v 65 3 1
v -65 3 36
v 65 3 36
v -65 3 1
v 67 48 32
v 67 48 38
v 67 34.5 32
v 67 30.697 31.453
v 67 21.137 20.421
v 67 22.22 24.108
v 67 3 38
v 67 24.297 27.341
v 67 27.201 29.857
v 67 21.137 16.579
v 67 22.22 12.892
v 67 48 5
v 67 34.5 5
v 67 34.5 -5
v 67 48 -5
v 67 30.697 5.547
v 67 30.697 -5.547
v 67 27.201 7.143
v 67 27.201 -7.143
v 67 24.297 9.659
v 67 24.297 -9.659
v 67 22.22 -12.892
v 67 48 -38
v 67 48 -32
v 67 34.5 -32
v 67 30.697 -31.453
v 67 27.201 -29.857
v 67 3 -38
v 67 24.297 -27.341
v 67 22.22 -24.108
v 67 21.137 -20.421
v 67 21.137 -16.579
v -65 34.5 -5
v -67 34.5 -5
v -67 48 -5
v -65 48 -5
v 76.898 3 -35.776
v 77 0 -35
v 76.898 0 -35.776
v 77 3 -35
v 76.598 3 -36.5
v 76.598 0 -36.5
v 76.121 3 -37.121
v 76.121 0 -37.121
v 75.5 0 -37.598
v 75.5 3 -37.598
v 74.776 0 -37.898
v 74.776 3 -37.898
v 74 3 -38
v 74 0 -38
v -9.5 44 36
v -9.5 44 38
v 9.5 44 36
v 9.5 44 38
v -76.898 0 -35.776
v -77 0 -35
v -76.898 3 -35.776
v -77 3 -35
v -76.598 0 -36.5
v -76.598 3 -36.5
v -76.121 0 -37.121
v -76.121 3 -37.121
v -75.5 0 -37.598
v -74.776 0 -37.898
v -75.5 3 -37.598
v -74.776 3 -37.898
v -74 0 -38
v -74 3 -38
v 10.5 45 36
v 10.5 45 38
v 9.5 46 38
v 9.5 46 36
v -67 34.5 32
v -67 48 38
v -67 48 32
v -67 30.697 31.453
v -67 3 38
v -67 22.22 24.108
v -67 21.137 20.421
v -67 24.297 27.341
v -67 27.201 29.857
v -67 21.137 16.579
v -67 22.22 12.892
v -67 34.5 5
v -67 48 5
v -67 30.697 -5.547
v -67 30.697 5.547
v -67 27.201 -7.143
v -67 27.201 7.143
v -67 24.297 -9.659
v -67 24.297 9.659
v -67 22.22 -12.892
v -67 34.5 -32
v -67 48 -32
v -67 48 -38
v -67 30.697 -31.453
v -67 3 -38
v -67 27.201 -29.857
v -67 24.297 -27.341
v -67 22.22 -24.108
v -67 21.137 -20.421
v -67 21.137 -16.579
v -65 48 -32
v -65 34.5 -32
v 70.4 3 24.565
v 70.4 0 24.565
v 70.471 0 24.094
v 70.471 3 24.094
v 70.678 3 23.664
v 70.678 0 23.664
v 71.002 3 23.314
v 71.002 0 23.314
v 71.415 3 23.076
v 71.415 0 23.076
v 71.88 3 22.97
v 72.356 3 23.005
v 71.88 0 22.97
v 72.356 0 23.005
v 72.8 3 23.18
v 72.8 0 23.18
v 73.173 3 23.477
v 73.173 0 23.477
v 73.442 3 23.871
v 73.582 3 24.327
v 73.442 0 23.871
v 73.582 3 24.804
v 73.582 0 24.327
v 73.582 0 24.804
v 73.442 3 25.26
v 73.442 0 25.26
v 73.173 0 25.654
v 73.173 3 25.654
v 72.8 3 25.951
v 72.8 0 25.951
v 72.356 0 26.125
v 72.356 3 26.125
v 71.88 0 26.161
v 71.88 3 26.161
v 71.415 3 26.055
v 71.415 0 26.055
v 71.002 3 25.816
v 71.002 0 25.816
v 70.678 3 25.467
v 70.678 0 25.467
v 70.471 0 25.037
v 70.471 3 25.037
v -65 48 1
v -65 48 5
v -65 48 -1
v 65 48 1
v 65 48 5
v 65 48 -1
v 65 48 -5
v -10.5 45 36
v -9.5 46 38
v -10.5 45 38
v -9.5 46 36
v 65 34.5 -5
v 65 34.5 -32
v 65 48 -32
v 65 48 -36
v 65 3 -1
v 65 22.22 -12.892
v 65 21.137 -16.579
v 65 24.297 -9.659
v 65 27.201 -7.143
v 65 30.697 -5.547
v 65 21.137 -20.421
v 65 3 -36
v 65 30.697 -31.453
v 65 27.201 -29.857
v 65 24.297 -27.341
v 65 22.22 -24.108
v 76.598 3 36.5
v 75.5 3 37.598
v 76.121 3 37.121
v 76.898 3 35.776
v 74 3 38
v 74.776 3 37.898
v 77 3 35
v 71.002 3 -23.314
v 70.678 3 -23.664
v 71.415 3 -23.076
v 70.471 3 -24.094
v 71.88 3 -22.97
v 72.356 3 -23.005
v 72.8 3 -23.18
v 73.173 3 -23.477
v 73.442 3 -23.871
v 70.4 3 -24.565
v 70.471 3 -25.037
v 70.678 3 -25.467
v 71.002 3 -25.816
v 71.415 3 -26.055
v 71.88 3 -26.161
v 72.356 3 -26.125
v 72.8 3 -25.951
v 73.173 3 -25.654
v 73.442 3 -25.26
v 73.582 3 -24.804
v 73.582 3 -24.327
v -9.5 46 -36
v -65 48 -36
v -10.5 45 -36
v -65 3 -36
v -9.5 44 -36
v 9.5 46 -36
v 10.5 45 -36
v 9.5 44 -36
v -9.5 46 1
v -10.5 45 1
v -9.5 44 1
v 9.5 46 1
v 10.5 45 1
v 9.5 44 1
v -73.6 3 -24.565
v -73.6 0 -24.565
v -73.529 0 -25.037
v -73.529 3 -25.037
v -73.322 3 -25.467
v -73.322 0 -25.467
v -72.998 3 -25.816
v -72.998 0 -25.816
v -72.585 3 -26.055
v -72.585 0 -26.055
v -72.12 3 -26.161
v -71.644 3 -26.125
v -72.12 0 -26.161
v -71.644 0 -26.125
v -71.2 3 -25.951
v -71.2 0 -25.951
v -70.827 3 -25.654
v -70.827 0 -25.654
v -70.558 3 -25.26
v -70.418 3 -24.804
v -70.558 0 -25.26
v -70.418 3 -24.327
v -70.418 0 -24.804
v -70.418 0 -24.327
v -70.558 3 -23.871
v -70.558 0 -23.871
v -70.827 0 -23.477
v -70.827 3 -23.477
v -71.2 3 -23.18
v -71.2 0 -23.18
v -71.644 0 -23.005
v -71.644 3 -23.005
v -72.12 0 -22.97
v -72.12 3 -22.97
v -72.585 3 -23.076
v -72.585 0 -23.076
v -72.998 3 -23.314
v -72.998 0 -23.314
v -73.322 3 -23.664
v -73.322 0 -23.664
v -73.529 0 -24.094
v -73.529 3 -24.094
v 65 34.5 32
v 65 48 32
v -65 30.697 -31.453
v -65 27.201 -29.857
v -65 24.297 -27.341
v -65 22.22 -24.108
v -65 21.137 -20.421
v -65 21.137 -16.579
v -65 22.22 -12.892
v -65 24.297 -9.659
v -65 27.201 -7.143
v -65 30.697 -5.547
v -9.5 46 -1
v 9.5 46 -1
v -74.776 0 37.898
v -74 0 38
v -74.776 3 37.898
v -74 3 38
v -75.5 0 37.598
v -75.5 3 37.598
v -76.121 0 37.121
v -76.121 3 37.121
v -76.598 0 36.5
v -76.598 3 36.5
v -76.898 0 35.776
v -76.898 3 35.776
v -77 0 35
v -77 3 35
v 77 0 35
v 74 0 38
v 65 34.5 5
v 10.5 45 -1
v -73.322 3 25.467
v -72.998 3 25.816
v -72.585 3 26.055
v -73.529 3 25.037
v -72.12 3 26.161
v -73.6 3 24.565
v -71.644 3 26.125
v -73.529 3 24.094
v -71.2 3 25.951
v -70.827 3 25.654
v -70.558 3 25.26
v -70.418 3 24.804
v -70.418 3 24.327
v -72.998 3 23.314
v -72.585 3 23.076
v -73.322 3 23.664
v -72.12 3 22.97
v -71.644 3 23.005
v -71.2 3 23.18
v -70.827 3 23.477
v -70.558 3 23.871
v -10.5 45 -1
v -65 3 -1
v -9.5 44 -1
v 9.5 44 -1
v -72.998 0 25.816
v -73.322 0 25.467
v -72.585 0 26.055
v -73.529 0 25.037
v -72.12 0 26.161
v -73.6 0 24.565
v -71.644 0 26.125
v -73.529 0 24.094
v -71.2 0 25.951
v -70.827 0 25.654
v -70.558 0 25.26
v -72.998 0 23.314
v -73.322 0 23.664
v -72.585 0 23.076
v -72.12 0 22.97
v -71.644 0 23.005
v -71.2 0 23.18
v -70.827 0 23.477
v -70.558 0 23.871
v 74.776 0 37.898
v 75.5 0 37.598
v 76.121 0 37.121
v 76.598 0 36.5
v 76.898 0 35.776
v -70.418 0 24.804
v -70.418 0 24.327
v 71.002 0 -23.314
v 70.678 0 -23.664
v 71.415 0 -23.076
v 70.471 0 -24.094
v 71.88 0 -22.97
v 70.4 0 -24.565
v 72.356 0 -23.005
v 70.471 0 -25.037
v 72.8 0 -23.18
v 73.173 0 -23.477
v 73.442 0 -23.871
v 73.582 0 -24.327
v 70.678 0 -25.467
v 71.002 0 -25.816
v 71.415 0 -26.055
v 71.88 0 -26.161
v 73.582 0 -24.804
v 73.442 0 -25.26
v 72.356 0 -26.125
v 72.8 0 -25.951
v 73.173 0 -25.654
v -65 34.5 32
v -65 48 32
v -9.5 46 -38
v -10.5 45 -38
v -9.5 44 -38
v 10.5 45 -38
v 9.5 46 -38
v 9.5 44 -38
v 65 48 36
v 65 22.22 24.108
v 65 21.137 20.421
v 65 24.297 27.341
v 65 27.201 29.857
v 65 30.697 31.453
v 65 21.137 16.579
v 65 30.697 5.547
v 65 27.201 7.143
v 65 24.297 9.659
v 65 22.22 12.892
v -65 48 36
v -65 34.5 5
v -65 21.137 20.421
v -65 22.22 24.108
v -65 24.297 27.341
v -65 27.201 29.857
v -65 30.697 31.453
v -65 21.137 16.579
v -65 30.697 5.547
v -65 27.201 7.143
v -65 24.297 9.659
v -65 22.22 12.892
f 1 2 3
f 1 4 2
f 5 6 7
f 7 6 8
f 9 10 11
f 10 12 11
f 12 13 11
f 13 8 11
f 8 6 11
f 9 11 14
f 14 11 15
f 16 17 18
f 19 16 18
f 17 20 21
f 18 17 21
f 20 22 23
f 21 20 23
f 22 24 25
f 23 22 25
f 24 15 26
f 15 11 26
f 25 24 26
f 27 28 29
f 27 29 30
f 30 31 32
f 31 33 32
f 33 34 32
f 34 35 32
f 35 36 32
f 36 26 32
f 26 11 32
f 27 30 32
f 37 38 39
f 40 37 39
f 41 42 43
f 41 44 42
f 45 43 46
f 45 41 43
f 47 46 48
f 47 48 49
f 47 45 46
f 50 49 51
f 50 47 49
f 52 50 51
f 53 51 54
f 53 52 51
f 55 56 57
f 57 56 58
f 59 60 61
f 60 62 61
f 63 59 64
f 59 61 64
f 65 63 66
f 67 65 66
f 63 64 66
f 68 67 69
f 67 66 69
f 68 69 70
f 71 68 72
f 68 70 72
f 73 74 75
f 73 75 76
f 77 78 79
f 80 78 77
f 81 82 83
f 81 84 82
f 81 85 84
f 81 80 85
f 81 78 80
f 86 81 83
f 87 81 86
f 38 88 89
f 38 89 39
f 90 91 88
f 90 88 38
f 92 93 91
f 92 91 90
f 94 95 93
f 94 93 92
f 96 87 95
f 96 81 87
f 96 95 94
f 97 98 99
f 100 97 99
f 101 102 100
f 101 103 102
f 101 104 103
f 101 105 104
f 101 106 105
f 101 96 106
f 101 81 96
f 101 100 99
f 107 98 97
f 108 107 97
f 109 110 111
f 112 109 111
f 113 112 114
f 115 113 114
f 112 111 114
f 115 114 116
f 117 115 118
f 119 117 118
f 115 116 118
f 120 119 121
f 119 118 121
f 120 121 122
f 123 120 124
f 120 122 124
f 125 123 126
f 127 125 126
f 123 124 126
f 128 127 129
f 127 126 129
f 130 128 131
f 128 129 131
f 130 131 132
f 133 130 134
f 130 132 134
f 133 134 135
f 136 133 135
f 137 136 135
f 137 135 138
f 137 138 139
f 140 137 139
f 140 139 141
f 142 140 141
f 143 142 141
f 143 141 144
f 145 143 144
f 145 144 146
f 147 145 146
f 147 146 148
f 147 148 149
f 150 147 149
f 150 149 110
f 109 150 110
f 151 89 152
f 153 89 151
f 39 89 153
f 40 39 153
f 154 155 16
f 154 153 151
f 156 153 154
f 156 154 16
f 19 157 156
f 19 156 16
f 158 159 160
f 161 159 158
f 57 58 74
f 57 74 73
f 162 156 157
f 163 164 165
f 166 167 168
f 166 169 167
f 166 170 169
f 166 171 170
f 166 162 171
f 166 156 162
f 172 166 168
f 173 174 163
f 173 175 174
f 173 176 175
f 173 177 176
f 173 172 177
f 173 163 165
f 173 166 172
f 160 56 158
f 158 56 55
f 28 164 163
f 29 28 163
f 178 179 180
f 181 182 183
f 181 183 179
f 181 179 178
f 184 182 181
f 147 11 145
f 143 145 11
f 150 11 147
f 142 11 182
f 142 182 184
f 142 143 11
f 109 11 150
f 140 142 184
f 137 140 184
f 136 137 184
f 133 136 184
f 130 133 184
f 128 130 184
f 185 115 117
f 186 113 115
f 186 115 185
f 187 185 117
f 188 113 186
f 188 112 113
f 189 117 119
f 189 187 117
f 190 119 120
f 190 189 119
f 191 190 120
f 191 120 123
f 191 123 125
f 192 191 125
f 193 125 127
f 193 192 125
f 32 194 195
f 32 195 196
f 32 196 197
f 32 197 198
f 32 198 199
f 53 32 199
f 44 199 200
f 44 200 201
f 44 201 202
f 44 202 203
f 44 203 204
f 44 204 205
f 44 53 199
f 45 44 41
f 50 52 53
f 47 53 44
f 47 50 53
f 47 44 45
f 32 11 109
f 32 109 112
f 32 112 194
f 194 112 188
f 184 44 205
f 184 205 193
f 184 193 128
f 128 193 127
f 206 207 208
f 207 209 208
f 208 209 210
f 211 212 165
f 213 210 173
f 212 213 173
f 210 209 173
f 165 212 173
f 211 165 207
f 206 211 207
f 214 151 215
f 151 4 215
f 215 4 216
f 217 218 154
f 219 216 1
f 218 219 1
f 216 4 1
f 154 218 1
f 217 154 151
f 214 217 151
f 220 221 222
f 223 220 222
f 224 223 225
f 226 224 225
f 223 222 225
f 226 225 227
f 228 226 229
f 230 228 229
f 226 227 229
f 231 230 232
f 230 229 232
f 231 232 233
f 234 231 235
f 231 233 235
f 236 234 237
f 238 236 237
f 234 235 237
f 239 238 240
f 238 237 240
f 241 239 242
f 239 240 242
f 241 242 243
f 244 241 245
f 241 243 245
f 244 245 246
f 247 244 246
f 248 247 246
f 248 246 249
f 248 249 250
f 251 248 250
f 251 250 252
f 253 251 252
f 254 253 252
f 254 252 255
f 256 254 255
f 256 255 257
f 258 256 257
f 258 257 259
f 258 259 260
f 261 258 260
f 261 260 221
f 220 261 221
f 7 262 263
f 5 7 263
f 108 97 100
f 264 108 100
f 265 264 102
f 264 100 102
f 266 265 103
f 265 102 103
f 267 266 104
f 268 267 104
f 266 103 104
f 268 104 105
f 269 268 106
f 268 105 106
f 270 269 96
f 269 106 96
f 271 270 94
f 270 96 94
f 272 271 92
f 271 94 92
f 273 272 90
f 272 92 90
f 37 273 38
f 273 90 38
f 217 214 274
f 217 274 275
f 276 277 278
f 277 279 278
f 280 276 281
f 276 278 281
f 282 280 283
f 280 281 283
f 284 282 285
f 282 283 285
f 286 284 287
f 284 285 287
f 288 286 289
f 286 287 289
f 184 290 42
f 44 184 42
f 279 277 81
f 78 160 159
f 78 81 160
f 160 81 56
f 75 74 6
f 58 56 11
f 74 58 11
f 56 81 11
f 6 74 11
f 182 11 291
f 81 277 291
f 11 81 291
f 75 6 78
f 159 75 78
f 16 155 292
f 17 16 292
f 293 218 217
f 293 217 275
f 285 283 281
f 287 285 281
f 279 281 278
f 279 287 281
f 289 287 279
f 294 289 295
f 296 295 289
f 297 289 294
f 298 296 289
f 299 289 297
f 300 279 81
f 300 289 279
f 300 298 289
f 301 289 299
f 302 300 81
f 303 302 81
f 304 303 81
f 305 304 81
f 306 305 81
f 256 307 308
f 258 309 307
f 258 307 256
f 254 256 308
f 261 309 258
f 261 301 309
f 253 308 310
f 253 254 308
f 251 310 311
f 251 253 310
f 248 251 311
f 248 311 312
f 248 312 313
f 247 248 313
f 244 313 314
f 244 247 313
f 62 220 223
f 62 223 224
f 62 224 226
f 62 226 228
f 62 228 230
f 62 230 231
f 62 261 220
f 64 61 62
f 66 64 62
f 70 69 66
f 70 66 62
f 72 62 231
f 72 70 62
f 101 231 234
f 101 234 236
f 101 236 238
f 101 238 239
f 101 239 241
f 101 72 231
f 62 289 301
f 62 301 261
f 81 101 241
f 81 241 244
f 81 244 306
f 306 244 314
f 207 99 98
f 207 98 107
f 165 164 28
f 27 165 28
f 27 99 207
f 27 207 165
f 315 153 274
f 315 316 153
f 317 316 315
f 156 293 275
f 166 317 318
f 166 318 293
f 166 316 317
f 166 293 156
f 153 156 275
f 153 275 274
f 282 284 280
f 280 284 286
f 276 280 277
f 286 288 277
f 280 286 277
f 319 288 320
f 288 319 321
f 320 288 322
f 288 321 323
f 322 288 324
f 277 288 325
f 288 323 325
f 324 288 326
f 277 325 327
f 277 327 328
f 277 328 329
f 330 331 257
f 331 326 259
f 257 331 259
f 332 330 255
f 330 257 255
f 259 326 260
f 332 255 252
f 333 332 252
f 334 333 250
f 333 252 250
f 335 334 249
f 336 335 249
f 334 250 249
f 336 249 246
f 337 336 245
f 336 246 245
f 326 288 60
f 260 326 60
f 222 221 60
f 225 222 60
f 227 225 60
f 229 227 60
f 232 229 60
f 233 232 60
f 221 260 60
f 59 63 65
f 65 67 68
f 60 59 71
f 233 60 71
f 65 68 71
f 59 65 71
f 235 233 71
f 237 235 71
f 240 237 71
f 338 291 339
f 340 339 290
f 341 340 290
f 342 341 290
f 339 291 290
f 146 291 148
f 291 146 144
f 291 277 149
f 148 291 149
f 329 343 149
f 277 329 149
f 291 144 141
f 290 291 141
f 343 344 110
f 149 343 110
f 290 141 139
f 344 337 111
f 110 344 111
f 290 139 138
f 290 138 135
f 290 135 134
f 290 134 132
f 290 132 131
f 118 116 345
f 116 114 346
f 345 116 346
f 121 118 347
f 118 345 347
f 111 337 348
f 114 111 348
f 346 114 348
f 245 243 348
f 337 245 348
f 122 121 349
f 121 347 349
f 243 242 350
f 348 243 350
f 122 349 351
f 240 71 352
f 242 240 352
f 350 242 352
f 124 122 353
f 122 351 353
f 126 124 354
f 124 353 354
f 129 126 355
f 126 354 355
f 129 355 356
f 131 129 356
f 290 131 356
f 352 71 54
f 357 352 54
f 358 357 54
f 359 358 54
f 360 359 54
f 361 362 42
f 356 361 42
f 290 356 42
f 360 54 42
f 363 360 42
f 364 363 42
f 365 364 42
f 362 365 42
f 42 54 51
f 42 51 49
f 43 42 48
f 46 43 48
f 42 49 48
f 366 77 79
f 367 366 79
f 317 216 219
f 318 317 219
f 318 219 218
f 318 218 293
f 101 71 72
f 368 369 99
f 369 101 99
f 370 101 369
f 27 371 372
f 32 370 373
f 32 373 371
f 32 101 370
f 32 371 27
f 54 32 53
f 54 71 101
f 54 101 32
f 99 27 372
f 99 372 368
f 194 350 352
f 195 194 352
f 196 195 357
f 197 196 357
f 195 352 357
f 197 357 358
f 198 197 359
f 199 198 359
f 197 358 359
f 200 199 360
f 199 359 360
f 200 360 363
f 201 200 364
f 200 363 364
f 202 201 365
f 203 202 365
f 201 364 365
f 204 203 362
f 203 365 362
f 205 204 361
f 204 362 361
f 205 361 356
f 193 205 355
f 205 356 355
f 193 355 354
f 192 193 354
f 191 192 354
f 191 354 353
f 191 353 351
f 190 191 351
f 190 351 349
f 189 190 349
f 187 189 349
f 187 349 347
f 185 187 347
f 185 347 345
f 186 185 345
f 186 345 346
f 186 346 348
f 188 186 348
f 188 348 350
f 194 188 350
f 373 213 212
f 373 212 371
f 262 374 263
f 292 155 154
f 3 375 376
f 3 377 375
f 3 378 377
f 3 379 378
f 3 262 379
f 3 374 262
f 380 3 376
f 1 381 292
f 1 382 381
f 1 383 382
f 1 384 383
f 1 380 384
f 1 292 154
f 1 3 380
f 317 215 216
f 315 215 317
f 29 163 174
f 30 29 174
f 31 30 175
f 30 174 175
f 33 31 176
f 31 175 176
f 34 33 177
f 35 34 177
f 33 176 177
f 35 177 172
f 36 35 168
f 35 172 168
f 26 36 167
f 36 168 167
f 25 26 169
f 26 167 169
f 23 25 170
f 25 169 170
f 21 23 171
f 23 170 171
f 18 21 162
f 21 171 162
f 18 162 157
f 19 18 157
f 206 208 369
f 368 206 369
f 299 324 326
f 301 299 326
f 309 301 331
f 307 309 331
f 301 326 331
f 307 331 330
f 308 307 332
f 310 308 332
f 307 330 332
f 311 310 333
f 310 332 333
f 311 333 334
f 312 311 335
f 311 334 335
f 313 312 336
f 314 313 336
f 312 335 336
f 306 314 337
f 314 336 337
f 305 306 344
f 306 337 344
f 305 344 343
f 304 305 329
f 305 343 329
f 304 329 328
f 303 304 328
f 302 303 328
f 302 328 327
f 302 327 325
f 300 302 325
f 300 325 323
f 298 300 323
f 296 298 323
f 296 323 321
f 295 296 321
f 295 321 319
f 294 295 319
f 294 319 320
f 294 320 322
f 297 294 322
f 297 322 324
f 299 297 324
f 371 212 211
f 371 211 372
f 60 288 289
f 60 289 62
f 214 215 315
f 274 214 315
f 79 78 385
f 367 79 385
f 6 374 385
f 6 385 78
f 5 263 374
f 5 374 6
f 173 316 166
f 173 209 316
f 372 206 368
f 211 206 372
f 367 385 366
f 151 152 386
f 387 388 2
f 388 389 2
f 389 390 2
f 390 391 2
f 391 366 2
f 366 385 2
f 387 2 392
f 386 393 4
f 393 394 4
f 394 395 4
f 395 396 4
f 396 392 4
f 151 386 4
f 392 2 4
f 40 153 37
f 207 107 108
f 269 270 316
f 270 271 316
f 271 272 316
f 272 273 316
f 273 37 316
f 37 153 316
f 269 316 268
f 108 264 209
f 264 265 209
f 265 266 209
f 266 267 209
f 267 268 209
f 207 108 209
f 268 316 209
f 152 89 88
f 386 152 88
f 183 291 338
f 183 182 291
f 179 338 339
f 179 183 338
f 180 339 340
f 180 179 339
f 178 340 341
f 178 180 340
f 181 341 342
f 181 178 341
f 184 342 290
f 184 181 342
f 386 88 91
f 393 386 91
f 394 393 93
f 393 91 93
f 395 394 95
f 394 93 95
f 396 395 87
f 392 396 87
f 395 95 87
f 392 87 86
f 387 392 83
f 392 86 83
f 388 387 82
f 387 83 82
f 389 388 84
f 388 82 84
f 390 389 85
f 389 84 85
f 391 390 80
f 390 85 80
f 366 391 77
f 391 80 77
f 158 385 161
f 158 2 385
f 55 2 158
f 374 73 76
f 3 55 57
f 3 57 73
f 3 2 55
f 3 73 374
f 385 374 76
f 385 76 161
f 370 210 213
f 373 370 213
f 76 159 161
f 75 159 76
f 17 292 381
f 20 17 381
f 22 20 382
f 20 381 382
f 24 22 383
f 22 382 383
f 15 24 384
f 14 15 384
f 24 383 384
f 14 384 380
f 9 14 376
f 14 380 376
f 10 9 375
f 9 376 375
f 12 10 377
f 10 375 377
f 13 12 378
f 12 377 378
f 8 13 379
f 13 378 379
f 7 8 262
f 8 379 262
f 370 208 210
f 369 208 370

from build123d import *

# Parameters (mm, degrees)
SZKIC1_W                    = 154
SZKIC1_H                    = 76
DODANIE_WYCI_GNI_CIE1_DEPTH = 3
SZKIC1_3_W                  = 134
SZKIC1_3_H                  = 76
SZKIC1_3_W_2                = 130
SZKIC1_3_H_2                = 72
SZKIC1_3_H_3                = 2
DODANIE_WYCI_GNI_CIE2_DEPTH = 48
WYTNIJ_WYCI_GNI_CIE1_DEPTH  = 157.473639953
M3_CLEARANCE_HOLE1_D        = 3.2
M3_CLEARANCE_HOLE1_DEPTH    = 7.7
M3_CLEARANCE_HOLE1_TIP      = 0.96137699
ZAOKR_GLENIE1_R             = 3
SZKIC6_W                    = 21
SZKIC6_H                    = 2
WYTNIJ_WYCI_GNI_CIE2_DEPTH  = 119.359621493
SFAZOWANIE1_SIZE            = 1


with BuildPart() as part:
    # Szkic1 → Dodanie-wyciągnięcie1 (new body)
    with BuildSketch(Plane(origin=(0, 0, 0), x_dir=(1, 0, 0), z_dir=(0, 1, 0))):
        Rectangle(SZKIC1_W, SZKIC1_H)
    extrude(amount=DODANIE_WYCI_GNI_CIE1_DEPTH)

    # Szkic1<3> → Dodanie-wyciągnięcie2 (add)
    # profile 1 of 2: a face of its own
    with BuildSketch(Plane(origin=(0, 0, 0), x_dir=(1, 0, 0), z_dir=(0, 1, 0))):
        Rectangle(SZKIC1_3_W, SZKIC1_3_H)
        Rectangle(SZKIC1_3_W_2, SZKIC1_3_H_2, mode=Mode.SUBTRACT)
    # profile 2 of 2: a face of its own
    with BuildSketch(Plane(origin=(0, 0, 0), x_dir=(1, 0, 0), z_dir=(0, 1, 0))):
        Rectangle(SZKIC1_3_W_2, SZKIC1_3_H_3)
    extrude(amount=DODANIE_WYCI_GNI_CIE2_DEPTH)

    # Szkic2 → Wytnij-wyciągnięcie1 (cut, through all)
    with BuildSketch(Plane.ZY.offset(67)):
        with BuildLine():
            ThreePointArc((-5, 34.5), (-8.954058454, 44.045941546), (-18.5, 48))
            ThreePointArc((-18.5, 48), (-28.045941546, 44.045941546), (-32, 34.5))
            Line((-32, 34.5), (-5, 34.5))
        make_face()
        with BuildLine():
            Line((-5, 34.5), (-32, 34.5))
            ThreePointArc((-32, 34.5), (-18.5, 21), (-5, 34.5))
        make_face()
        with BuildLine():
            Line((-18.5, 48), (-32, 48))
            Line((-32, 48), (-32, 34.5))
            ThreePointArc((-32, 34.5), (-28.045941546, 44.045941546), (-18.5, 48))
        make_face()
        with BuildLine():
            Line((-5, 48), (-18.5, 48))
            ThreePointArc((-18.5, 48), (-8.954058454, 44.045941546), (-5, 34.5))
            Line((-5, 34.5), (-5, 48))
        make_face()
        with BuildLine():
            ThreePointArc((18.5, 48), (8.954058454, 44.045941546), (5, 34.5))
            Line((5, 34.5), (32, 34.5))
            ThreePointArc((32, 34.5), (28.045941546, 44.045941546), (18.5, 48))
        make_face()
        with BuildLine():
            Line((32, 34.5), (5, 34.5))
            ThreePointArc((5, 34.5), (18.5, 21), (32, 34.5))
        make_face()
        with BuildLine():
            Line((18.5, 48), (5, 48))
            Line((5, 48), (5, 34.5))
            ThreePointArc((5, 34.5), (8.954058454, 44.045941546), (18.5, 48))
        make_face()
        with BuildLine():
            Line((32, 48), (18.5, 48))
            ThreePointArc((18.5, 48), (28.045941546, 44.045941546), (32, 34.5))
            Line((32, 34.5), (32, 48))
        make_face()
    extrude(amount=-WYTNIJ_WYCI_GNI_CIE1_DEPTH, mode=Mode.SUBTRACT)

    # M3 Clearance Hole1
    with Locations(Plane(origin=(0, 3, 0), x_dir=(1, 0, 0), z_dir=(0, 1, 0))):
        with Locations((-72, 24.565309611), (-72, -24.565309611), (72, -24.565309611), (72, 24.565309611)):
            Hole(M3_CLEARANCE_HOLE1_D / 2, depth=M3_CLEARANCE_HOLE1_DEPTH)
            with Locations((0, 0, -(M3_CLEARANCE_HOLE1_DEPTH + M3_CLEARANCE_HOLE1_TIP / 2))):  # 118° drill point
                Cone(0, M3_CLEARANCE_HOLE1_D / 2, M3_CLEARANCE_HOLE1_TIP, mode=Mode.SUBTRACT)

    # Zaokrąglenie1
    zaokr_glenie1_edges = [part.edges().sort_by_distance(p)[0] for p in [
        (77, 1.5, 38),
        (77, 1.5, -38),
        (-77, 1.5, 38),
        (-77, 1.5, -38),
    ]]
    fillet(zaokr_glenie1_edges, radius=ZAOKR_GLENIE1_R)

    # Szkic6 → Wytnij-wyciągnięcie2 (cut, through all)
    with BuildSketch(Plane.XY.offset(38)):
        with Locations((0, 45)):
            Rectangle(SZKIC6_W, SZKIC6_H)
    extrude(amount=-WYTNIJ_WYCI_GNI_CIE2_DEPTH, mode=Mode.SUBTRACT)

    # Sfazowanie1
    sfazowanie1_edges = [part.edges().sort_by_distance(p)[0] for p in [
        (10.5, 44, 37),
        (10.5, 46, 37),
        (-10.5, 46, 37),
        (-10.5, 44, 37),
        (10.5, 46, -37),
        (10.5, 44, -37),
        (-10.5, 46, -37),
        (-10.5, 44, -37),
        (-10.5, 46, 0),
        (-10.5, 44, 0),
        (10.5, 46, 0),
        (10.5, 44, 0),
    ]]
    chamfer(sfazowanie1_edges, length=SFAZOWANIE1_SIZE - 0.0001)  # a hair under: the kernel refuses the full size


solid = part.part
